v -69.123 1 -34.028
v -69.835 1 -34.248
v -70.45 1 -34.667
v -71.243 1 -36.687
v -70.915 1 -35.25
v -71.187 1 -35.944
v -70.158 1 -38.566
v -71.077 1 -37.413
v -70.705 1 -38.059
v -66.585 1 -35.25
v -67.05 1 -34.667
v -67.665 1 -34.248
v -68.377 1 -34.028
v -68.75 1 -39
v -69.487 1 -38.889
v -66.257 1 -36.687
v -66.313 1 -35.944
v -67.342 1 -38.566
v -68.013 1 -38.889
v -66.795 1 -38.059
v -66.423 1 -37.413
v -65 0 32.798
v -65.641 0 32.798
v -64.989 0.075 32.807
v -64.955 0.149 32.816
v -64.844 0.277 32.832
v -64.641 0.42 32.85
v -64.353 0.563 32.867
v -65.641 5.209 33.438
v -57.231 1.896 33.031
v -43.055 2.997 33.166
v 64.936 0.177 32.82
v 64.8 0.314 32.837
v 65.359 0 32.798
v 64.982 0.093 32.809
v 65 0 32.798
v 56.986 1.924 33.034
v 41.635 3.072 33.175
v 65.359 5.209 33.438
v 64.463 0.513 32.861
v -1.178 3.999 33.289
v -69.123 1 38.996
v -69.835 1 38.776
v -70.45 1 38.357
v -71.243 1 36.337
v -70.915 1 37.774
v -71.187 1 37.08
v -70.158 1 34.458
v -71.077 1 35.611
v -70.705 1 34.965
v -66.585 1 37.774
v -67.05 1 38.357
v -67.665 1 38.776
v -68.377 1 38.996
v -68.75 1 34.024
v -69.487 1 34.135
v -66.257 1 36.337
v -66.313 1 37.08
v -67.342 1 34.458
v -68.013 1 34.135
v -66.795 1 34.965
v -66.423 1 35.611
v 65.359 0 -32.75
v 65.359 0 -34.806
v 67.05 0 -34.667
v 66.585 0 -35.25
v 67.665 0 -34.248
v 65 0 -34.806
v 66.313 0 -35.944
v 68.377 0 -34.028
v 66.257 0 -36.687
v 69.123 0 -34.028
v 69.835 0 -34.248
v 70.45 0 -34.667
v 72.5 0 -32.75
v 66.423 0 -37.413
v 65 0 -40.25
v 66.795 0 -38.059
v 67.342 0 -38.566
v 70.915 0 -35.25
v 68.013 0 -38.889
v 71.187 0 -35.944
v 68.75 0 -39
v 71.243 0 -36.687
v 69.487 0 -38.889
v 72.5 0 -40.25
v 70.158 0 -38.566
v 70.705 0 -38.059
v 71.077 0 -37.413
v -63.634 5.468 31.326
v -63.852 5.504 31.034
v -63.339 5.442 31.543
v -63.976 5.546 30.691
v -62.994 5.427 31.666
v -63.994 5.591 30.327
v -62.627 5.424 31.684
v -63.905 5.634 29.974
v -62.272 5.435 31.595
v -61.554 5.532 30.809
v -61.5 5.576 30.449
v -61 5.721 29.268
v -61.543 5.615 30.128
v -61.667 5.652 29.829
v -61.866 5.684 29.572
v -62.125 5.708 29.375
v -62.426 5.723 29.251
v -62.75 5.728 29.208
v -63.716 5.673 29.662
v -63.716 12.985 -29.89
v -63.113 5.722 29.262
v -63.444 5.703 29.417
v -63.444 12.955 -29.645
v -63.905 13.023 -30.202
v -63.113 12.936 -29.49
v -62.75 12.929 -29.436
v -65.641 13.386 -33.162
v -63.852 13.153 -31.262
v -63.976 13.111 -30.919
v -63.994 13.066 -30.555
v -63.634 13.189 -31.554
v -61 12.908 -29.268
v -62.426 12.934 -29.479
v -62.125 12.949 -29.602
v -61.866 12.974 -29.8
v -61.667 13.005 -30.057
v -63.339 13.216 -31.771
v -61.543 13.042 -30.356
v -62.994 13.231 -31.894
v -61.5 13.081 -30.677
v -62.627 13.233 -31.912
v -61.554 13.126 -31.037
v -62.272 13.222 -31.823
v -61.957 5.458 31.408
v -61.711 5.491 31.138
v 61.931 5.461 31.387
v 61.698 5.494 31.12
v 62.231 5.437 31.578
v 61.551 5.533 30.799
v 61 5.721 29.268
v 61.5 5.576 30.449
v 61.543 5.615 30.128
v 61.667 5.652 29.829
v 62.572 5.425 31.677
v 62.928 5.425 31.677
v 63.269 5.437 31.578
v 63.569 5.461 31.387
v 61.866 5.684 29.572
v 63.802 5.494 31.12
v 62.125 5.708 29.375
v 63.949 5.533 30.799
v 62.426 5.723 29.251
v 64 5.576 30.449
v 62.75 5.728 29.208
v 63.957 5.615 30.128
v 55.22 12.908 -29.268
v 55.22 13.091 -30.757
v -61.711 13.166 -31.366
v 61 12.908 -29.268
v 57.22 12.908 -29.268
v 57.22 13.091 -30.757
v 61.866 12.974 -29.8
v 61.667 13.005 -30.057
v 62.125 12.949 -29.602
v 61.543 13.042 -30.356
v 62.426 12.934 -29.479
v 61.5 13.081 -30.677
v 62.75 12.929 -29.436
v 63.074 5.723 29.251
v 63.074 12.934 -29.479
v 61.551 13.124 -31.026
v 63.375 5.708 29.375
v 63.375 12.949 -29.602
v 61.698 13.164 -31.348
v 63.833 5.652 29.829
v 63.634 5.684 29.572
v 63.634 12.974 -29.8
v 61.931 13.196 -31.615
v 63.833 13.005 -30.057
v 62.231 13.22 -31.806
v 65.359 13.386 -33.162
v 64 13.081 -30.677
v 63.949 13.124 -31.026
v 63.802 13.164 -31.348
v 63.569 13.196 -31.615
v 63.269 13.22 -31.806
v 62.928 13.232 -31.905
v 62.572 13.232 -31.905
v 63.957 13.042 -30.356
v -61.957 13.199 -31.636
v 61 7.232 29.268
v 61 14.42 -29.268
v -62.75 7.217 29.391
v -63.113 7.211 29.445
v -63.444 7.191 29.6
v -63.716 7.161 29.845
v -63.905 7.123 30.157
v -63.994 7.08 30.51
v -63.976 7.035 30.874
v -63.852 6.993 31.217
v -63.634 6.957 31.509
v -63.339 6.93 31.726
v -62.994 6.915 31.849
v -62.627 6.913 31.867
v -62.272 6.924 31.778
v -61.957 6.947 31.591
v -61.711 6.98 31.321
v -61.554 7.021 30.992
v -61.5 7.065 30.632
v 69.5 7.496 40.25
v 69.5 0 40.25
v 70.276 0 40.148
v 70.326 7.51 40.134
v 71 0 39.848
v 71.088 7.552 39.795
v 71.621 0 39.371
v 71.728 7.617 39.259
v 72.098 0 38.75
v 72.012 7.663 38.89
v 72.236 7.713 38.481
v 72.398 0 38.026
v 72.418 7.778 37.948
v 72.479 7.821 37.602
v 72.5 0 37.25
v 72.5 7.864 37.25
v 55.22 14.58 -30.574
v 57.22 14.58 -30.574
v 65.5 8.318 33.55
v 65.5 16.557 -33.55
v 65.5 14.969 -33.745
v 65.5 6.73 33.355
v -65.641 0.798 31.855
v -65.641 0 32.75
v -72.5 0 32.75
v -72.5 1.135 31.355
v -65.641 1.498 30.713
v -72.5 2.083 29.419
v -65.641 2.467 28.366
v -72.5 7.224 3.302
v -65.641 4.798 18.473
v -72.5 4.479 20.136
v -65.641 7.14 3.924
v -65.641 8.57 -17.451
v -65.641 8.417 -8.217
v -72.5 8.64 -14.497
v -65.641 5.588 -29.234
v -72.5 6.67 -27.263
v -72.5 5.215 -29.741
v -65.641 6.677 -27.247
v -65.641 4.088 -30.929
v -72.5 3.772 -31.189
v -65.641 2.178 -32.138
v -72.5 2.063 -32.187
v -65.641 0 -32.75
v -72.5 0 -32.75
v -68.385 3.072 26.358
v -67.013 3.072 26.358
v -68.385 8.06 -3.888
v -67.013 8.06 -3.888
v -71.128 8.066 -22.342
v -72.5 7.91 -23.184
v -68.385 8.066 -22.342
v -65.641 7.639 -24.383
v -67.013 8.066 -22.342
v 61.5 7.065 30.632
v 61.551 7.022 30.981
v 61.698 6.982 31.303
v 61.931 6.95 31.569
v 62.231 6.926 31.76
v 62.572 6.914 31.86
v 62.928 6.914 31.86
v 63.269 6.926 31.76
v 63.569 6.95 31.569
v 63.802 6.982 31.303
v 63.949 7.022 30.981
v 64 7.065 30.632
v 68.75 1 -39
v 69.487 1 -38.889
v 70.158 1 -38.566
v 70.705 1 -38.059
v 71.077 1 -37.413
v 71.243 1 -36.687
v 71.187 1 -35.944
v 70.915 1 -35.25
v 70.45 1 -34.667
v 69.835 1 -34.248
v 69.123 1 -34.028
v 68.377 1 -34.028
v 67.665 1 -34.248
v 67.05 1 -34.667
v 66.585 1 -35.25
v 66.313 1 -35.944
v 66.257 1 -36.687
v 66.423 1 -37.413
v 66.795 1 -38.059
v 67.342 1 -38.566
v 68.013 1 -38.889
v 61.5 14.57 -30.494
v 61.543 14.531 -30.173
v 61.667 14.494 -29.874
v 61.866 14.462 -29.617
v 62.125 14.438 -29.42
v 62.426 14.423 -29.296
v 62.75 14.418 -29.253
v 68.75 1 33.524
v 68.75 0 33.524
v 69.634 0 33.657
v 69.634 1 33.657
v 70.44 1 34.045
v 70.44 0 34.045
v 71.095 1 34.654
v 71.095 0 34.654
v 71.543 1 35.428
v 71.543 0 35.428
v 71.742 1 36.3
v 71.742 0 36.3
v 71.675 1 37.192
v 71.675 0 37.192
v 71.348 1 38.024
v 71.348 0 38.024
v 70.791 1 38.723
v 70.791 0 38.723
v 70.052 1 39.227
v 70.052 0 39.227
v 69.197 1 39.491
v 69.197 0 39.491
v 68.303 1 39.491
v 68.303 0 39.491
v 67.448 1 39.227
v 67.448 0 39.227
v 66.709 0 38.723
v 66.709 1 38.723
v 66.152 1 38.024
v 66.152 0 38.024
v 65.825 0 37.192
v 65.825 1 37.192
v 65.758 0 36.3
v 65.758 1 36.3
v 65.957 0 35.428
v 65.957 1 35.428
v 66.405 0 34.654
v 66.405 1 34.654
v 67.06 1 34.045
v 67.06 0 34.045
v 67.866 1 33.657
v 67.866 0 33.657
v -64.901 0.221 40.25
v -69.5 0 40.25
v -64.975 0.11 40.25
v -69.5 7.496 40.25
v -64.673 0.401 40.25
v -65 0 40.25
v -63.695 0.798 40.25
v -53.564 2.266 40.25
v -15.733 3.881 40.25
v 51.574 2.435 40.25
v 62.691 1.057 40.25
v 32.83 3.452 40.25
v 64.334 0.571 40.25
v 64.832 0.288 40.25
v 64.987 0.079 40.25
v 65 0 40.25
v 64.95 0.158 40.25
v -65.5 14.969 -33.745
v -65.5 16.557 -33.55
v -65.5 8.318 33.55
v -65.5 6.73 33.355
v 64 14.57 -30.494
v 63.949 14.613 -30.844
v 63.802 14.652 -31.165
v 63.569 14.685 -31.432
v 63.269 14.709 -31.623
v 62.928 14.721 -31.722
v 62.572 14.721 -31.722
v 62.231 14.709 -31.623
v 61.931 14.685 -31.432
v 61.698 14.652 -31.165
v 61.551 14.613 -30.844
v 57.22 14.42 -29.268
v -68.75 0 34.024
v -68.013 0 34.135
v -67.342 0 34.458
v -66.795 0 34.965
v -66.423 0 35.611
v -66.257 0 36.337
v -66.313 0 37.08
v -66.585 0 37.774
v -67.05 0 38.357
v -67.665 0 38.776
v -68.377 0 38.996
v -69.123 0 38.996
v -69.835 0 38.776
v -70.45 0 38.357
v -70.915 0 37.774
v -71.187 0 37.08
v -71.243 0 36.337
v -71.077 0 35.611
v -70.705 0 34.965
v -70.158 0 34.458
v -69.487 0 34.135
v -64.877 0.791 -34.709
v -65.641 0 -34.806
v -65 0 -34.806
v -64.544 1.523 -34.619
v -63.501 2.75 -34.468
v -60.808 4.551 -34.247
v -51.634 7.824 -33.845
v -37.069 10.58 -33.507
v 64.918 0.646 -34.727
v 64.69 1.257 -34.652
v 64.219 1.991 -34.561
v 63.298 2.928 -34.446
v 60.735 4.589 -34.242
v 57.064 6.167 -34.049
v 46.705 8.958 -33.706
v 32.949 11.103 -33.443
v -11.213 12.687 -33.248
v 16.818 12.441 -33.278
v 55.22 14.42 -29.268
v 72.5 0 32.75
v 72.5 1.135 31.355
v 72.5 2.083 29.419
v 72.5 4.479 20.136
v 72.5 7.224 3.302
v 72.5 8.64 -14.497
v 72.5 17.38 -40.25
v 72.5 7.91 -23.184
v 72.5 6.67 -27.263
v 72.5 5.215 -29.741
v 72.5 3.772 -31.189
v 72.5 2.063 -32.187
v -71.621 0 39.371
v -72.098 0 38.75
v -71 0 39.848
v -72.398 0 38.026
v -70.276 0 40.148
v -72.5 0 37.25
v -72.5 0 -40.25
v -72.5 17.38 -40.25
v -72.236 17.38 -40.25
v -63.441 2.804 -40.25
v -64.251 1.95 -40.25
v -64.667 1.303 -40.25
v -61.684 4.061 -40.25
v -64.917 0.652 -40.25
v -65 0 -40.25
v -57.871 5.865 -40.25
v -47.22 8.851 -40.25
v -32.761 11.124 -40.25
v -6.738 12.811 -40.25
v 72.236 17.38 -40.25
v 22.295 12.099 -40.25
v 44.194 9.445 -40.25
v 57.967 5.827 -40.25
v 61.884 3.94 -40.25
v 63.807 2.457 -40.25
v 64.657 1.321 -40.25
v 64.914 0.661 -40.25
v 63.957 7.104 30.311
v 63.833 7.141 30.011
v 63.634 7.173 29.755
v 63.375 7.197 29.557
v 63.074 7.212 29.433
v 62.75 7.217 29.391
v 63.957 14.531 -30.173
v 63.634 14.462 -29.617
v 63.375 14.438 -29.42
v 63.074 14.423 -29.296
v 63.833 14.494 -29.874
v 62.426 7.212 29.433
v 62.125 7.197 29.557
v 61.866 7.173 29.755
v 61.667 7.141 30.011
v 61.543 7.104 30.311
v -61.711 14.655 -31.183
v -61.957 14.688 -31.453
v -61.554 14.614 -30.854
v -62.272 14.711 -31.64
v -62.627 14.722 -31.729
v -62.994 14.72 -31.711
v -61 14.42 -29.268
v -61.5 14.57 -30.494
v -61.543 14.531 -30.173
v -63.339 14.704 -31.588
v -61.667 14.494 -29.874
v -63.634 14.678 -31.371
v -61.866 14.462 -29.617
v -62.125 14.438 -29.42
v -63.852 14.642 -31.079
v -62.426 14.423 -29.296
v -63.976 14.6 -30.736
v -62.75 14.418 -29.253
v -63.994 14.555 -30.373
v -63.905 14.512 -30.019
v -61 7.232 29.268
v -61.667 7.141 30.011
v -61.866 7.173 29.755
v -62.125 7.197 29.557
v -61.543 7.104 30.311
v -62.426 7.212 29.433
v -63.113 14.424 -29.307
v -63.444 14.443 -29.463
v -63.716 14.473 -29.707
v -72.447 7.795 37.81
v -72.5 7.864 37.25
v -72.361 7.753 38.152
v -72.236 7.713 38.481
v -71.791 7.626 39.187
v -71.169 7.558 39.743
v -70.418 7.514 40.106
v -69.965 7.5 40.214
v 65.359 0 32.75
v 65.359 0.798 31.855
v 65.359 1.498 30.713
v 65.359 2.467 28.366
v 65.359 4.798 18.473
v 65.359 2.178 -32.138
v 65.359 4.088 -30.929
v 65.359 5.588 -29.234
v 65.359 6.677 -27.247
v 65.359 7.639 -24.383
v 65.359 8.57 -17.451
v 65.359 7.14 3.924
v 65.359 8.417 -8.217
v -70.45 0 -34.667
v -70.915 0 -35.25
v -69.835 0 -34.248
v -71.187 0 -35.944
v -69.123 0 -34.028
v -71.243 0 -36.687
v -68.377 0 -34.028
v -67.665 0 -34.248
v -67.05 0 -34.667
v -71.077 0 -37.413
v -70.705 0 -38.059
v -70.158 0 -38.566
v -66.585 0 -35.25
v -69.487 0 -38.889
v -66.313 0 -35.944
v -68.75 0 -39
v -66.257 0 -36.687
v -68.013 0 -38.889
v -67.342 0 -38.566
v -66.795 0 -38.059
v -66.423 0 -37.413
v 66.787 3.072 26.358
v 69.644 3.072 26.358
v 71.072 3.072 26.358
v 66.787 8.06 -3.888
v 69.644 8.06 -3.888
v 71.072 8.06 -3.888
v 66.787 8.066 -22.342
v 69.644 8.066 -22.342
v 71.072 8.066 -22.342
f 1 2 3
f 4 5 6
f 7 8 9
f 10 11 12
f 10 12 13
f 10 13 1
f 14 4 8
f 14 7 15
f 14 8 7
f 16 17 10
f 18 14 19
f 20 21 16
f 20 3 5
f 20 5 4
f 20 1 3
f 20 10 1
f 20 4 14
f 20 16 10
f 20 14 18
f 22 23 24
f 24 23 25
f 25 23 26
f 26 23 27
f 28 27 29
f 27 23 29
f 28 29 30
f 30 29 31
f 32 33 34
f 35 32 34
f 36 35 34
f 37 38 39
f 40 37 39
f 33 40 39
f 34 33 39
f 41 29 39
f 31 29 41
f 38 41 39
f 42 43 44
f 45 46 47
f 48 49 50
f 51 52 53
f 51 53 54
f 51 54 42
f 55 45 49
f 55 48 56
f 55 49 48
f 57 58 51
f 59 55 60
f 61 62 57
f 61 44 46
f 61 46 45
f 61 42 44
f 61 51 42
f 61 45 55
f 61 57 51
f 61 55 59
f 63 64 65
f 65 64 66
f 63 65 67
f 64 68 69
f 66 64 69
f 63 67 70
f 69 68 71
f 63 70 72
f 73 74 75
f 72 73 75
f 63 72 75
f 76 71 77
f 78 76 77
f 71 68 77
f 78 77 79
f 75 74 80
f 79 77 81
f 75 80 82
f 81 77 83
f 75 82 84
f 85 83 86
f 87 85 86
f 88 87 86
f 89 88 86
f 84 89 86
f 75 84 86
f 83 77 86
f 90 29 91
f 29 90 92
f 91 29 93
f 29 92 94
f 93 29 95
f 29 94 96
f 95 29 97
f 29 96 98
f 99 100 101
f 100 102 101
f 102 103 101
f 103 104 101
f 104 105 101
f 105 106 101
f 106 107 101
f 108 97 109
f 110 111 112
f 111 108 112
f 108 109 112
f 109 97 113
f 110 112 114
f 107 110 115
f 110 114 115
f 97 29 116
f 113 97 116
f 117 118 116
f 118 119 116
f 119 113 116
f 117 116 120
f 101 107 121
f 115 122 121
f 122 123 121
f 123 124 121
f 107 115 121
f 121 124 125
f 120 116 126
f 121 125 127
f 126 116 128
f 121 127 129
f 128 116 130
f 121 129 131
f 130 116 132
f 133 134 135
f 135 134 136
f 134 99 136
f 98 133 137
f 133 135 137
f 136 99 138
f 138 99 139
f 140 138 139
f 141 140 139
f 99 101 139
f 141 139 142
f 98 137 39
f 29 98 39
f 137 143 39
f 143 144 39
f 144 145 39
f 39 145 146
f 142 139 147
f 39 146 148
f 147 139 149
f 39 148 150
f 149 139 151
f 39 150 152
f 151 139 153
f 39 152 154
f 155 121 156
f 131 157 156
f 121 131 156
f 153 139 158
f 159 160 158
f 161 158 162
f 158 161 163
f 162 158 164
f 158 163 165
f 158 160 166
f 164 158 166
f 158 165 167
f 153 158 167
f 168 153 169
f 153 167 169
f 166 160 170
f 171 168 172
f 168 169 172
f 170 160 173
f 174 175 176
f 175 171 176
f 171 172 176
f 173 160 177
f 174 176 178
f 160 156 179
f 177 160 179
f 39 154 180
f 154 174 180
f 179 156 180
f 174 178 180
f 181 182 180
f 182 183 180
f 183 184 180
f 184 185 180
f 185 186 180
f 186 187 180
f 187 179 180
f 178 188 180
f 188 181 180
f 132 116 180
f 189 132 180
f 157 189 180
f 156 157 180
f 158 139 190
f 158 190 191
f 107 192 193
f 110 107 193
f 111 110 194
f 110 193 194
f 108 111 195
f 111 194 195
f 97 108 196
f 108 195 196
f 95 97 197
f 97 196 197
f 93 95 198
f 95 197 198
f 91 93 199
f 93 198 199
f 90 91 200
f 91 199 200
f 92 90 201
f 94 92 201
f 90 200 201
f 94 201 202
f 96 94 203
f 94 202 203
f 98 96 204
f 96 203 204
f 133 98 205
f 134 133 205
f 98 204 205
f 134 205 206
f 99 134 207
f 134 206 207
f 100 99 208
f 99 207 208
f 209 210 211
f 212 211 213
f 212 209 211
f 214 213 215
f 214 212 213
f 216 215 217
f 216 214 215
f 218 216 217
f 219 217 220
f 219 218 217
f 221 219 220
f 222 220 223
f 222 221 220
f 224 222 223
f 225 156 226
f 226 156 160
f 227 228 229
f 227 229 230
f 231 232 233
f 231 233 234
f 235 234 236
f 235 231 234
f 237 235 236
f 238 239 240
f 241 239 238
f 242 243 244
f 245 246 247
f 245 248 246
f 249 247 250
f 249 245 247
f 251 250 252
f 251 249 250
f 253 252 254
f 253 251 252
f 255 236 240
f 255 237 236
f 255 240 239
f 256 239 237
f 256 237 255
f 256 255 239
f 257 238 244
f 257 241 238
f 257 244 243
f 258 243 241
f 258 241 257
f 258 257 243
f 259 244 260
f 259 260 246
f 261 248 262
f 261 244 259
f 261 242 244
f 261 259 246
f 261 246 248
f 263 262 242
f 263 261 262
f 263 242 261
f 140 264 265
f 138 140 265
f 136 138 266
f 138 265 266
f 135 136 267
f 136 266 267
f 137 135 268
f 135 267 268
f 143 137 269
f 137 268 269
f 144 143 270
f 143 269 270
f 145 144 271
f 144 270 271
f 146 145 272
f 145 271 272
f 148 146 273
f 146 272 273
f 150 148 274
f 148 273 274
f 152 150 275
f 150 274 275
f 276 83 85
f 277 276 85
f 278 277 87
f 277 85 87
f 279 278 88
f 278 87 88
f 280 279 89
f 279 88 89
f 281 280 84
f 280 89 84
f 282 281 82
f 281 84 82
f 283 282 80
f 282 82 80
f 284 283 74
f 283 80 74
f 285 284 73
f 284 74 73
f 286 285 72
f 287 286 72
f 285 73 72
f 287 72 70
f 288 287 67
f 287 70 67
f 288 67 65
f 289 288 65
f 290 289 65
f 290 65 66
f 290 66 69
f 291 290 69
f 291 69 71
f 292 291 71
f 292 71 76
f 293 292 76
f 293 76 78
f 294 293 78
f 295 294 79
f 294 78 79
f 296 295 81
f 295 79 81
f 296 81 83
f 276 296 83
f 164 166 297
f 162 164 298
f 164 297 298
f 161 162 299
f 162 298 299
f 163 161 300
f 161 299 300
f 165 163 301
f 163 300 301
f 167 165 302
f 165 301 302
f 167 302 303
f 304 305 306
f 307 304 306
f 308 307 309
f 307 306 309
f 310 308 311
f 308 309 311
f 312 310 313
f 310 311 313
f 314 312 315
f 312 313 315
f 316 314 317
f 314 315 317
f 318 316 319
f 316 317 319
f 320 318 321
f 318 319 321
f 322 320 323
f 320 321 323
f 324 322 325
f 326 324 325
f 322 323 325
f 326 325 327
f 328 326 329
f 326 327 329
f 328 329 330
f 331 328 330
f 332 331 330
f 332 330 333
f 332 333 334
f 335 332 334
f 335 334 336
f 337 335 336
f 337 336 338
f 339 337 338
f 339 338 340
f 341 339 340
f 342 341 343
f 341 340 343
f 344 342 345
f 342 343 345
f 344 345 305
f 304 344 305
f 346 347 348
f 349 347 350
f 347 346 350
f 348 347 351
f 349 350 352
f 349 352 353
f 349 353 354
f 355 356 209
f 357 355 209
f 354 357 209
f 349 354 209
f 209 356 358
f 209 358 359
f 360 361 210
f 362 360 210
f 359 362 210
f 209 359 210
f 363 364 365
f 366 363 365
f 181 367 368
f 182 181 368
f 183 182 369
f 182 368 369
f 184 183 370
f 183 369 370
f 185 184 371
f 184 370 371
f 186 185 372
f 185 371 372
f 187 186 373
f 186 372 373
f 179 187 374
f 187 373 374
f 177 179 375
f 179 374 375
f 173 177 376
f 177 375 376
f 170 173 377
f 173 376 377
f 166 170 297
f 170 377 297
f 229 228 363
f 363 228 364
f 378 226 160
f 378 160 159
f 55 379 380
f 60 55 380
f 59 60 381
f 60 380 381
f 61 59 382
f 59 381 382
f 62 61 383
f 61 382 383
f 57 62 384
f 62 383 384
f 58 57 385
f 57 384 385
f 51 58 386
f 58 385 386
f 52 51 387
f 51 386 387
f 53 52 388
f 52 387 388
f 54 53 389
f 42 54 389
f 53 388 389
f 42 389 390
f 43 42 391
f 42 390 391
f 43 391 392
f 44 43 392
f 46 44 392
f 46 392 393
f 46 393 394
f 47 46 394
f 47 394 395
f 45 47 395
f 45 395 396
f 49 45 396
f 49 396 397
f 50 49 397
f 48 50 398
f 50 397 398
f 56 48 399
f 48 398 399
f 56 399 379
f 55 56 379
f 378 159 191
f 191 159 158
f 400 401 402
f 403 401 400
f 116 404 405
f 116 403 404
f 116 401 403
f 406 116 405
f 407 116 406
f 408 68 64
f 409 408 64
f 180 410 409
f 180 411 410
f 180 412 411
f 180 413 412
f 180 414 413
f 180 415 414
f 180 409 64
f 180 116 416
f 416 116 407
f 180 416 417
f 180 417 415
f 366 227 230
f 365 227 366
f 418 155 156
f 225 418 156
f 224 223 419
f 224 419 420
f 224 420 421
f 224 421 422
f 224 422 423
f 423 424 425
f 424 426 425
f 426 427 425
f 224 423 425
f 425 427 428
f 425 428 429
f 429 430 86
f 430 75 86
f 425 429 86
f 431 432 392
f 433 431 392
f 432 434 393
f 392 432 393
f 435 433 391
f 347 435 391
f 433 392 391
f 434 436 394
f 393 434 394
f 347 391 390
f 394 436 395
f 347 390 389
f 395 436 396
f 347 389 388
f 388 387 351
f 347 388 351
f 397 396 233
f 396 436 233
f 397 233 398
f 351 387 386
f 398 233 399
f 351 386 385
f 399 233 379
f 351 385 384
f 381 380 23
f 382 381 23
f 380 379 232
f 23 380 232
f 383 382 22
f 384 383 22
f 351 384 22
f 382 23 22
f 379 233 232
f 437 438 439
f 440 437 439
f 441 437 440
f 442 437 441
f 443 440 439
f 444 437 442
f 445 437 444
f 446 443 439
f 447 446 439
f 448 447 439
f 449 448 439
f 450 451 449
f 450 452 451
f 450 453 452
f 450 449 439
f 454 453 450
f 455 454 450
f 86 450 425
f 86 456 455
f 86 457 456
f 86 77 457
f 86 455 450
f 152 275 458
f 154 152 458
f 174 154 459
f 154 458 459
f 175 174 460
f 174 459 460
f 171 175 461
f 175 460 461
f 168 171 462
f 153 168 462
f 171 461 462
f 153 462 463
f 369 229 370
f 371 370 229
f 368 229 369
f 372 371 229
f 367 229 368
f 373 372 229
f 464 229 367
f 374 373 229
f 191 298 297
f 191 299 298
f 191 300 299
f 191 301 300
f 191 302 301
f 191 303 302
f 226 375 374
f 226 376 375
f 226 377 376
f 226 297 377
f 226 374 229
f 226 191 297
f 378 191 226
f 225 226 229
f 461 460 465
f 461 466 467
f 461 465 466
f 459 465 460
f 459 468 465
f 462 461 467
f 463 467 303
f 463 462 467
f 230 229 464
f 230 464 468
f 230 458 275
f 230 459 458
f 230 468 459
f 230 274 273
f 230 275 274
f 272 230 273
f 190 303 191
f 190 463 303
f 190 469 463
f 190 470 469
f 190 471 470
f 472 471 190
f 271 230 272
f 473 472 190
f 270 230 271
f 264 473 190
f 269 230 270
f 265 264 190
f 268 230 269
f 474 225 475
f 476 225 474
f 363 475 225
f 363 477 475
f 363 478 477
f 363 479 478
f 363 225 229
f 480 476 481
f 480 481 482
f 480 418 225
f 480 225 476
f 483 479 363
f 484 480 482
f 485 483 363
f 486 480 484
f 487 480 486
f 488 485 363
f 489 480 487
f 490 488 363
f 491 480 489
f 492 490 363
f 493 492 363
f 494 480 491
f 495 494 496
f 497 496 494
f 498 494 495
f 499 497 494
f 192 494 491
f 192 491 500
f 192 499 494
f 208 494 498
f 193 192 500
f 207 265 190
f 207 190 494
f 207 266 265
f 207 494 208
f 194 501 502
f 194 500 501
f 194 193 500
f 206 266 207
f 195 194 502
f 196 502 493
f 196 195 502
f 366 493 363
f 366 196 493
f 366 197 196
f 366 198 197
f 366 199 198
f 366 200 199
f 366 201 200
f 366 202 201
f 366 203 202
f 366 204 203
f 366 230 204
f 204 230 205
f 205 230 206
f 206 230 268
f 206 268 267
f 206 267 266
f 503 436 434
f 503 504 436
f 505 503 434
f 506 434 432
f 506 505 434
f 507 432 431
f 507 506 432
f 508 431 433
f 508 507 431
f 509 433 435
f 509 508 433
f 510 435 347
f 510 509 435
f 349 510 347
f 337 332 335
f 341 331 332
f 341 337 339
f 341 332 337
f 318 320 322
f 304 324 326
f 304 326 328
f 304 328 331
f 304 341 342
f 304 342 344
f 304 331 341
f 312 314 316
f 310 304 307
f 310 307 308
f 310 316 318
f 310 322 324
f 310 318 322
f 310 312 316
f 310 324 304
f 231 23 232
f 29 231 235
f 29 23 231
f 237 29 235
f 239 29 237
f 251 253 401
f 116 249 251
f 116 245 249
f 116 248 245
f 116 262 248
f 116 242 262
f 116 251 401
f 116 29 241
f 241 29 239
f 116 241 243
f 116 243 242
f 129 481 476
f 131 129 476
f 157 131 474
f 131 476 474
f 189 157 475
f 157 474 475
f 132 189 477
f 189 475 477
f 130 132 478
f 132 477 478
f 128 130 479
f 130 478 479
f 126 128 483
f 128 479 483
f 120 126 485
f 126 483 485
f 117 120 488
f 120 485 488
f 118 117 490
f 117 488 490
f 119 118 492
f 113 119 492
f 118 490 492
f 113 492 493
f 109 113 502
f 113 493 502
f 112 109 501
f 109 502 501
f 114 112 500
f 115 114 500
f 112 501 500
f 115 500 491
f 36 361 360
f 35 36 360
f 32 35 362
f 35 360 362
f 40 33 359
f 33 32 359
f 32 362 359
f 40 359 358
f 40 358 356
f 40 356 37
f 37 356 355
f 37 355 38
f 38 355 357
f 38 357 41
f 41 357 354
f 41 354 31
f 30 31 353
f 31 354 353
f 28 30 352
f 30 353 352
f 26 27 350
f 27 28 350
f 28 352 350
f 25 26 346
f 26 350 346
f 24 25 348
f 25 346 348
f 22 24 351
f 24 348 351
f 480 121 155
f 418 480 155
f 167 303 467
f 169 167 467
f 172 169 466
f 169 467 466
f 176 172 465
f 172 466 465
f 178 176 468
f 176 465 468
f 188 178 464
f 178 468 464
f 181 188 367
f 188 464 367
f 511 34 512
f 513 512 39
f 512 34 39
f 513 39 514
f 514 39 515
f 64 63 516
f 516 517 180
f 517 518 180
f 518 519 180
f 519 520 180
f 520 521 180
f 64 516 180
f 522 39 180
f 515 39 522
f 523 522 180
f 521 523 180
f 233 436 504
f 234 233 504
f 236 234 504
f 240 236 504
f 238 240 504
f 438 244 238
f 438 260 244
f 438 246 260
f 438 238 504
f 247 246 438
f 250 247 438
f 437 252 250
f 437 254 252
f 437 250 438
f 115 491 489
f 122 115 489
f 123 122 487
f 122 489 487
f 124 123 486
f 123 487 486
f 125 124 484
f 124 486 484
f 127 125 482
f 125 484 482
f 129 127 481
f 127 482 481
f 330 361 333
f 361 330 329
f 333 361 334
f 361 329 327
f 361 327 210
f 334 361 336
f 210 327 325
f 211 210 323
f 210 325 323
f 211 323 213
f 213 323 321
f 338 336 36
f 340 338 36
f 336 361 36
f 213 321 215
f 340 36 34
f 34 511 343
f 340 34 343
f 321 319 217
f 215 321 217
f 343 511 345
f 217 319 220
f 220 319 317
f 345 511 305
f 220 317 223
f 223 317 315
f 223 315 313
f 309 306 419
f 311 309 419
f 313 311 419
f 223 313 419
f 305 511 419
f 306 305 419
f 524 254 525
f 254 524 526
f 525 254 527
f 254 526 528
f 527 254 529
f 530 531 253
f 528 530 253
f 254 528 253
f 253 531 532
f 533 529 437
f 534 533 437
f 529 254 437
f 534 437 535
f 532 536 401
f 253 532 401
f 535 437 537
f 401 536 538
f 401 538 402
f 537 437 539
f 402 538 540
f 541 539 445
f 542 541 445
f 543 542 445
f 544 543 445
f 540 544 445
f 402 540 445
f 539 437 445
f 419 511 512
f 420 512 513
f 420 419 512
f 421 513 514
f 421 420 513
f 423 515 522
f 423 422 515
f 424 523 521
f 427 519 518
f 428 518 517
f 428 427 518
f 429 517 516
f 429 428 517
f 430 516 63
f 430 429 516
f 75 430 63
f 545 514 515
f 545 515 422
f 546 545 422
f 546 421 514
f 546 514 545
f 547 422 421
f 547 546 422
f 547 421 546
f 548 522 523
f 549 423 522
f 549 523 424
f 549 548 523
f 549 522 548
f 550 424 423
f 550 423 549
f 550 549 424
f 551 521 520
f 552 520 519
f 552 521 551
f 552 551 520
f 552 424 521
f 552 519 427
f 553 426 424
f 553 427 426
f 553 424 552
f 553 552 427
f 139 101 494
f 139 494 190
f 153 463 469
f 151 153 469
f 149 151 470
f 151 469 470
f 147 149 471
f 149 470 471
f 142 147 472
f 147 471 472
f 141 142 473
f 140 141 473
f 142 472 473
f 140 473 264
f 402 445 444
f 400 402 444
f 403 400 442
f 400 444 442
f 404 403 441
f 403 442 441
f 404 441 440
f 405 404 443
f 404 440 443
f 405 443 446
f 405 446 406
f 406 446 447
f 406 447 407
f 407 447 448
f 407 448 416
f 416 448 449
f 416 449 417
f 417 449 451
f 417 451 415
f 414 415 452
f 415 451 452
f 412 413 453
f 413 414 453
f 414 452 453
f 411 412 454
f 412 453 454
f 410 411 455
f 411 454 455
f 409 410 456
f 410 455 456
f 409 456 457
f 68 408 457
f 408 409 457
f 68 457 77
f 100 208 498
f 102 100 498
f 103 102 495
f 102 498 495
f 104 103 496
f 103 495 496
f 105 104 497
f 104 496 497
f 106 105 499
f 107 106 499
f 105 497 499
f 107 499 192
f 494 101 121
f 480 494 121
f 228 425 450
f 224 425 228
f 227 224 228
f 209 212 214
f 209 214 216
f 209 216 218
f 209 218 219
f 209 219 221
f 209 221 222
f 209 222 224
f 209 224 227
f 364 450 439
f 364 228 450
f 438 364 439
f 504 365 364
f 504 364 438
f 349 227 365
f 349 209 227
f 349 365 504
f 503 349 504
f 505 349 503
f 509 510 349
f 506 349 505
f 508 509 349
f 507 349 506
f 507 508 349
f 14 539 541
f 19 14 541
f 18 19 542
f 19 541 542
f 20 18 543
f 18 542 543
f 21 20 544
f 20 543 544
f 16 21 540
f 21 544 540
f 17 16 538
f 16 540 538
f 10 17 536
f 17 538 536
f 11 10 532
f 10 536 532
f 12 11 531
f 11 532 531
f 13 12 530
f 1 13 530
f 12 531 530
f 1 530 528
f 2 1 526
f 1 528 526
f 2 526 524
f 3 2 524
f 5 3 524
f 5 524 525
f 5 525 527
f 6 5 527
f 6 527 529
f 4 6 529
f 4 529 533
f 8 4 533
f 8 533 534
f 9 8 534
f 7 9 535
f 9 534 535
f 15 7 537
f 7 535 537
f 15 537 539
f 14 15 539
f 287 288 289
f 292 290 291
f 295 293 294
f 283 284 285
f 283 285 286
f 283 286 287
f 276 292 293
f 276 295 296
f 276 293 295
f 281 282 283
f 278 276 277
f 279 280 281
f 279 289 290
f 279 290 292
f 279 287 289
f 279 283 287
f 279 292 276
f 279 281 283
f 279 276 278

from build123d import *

# Parameters (mm, degrees)
SKETCH1_W            = 145
SKETCH1_H            = 80.5
SKETCH1_W_2          = 131
SKETCH1_H_2          = 67.1
BOSS_EXTRUDE1_DEPTH  = 17.38
SKETCH2_W            = 145.621836594
SKETCH2_H            = 81.229894902
CUT_EXTRUDE1_DEPTH   = 10.38
FILLET1_R            = 3
SKETCH5_W            = 131
SKETCH5_H            = 67.1
SKETCH5_W_2          = 122
SKETCH5_H_2          = 58.53632086
BOSS_EXTRUDE17_DEPTH = 17.38
SKETCH9_W            = 144.471640976
SKETCH9_H            = 84.136143584
CUT_EXTRUDE5_DEPTH   = 9.6
SKETCH6_W            = 131
SKETCH6_H            = 67.603909288
CUT_EXTRUDE6_DEPTH   = 1.6
SKETCH10_RX          = 65
SKETCH10_RY          = 4
CUT_EXTRUDE8_DEPTH   = 10.7
SKETCH12_RX          = 65
SKETCH12_RY          = 12.88
CUT_EXTRUDE9_DEPTH   = 10.7
CUT_EXTRUDE12_START  = -145
CUT_EXTRUDE12_DEPTH  = 145
CUT_EXTRUDE13_DEPTH  = 10
SKETCH21_W           = 131
SKETCH21_H           = 67.1
CUT_EXTRUDE14_DEPTH  = 30
SKETCH23_R           = 2.5
SKETCH23_R_2         = 3
CUT_EXTRUDE15_DEPTH  = 1
CUT_EXTRUDE17_DEPTH  = 10


# Read off the part's stored shape, not the designer's step: Cut-Extrude12
with BuildPart() as part:
    # Sketch1 → Boss-Extrude1 (new body)
    with BuildSketch(Plane(origin=(0, 0, 0), x_dir=(1, 0, 0), z_dir=(0, 1, 0))):
        Rectangle(SKETCH1_W, SKETCH1_H)
        Rectangle(SKETCH1_W_2, SKETCH1_H_2, mode=Mode.SUBTRACT)
    extrude(amount=BOSS_EXTRUDE1_DEPTH)

    # Sketch2 → Cut-Extrude1 (cut)
    with BuildSketch(Plane(origin=(0, 12.253191712, 1.504502764), x_dir=(-1, 0, 0), z_dir=(0, 0.9925461516413239, 0.12186934340513403))):
        with Locations((0.310918297, -1.453124341)):
            Rectangle(SKETCH2_W, SKETCH2_H)
    extrude(amount=CUT_EXTRUDE1_DEPTH, mode=Mode.SUBTRACT)

    # Fillet1
    fillet1_edges = [part.edges().sort_by_distance(p)[0] for p in [
        (72.5, 3.747921424, 40.25),
        (-72.5, 3.747921424, 40.25),
    ]]
    fillet(fillet1_edges, radius=FILLET1_R)

    # Sketch5 → Boss-Extrude17 (add)
    with BuildSketch(Plane(origin=(0, 0, 0), x_dir=(1, 0, 0), z_dir=(0, 1, 0))):
        Rectangle(SKETCH5_W, SKETCH5_H)
        Rectangle(SKETCH5_W_2, SKETCH5_H_2, mode=Mode.SUBTRACT)
    extrude(amount=BOSS_EXTRUDE17_DEPTH)

    # Sketch9 → Cut-Extrude5 (cut)
    with BuildSketch(Plane(origin=(0, 12.253191712, 1.504502764), x_dir=(1, 0, 0), z_dir=(0, 0.9925461516413236, 0.12186934340513404))):
        Rectangle(SKETCH9_W, SKETCH9_H)
    extrude(amount=CUT_EXTRUDE5_DEPTH, mode=Mode.SUBTRACT)

    # Sketch6 → Cut-Extrude6 (cut)
    with BuildSketch(Plane(origin=(0, 12.253191712, 1.504502764), x_dir=(-1, 0, 0), z_dir=(0, 0.9925461516413239, 0.12186934340513403))):
        with Locations((0, -1.515801317)):
            Rectangle(SKETCH6_W, SKETCH6_H)
    extrude(amount=-CUT_EXTRUDE6_DEPTH, mode=Mode.SUBTRACT)

    # Sketch10 → Cut-Extrude8 (cut)
    with BuildSketch(Plane.XY.offset(40.25)):
        with Locations((0, 0)):
            Ellipse(SKETCH10_RX, SKETCH10_RY)
    extrude(amount=-CUT_EXTRUDE8_DEPTH, mode=Mode.SUBTRACT)

    # Sketch12 → Cut-Extrude9 (cut)
    with BuildSketch(Plane(origin=(0, 0, -40.25), x_dir=(-1, 0, 0), z_dir=(0, 0, -1))):
        with Locations((0, 0)):
            Ellipse(SKETCH12_RX, SKETCH12_RY)
    extrude(amount=-CUT_EXTRUDE9_DEPTH, mode=Mode.SUBTRACT)

    # Cut-Extrude12 outline → Cut-Extrude12 (cut)
    with BuildSketch(Plane.ZY.offset(72.5).offset(CUT_EXTRUDE12_START)):
        with BuildLine():
            add(Edge.make_bspline(
                [(32.75, 0), (29.101844556, 4.008435343), (19.440941834, 4.451750453), (-1.339502668, 8.255924616), (-30.587167794, 14.944494998), (-32.75, 0)],
                knots=[0, 0, 0, 0, 0, 0, 1, 1, 1, 1, 1, 1], degree=5))
            Line((-32.75, 0), (32.75, 0))
        make_face()
    extrude(amount=CUT_EXTRUDE12_DEPTH, mode=Mode.SUBTRACT)

    # Sketch19 → Cut-Extrude13 (cut)
    with BuildSketch(Plane(origin=(0, 10.66511787, 1.309511815), x_dir=(1, 0, 0), z_dir=(0, 0.9925461516413238, 0.12186934340513403))):
        with BuildLine():
            ThreePointArc((61.5, 32.0425), (61.866116524, 31.158616524), (62.75, 30.7925))
            Line((62.75, 30.7925), (62.75, 32.0425))
            Line((62.75, 32.0425), (61.5, 32.0425))
        make_face()
        with BuildLine():
            Line((62.75, 32.0425), (62.75, 30.7925))
            ThreePointArc((62.75, 30.7925), (63.633883476, 31.158616524), (64, 32.0425))
            ThreePointArc((64, 32.0425), (62.75, 33.2925), (61.5, 32.0425))
            Line((61.5, 32.0425), (62.75, 32.0425))
        make_face()
        with BuildLine():
            ThreePointArc((64, -29.5425), (63.633883476, -28.658616524), (62.75, -28.2925))
            Line((62.75, -28.2925), (62.75, -29.5425))
            Line((62.75, -29.5425), (61.5, -29.5425))
            ThreePointArc((61.5, -29.5425), (62.75, -30.7925), (64, -29.5425))
        make_face()
        with BuildLine():
            Line((62.75, -29.5425), (62.75, -28.2925))
            ThreePointArc((62.75, -28.2925), (61.866116524, -28.658616524), (61.5, -29.5425))
            Line((61.5, -29.5425), (62.75, -29.5425))
        make_face()
        with BuildLine():
            ThreePointArc((-61.5, -29.5425), (-61.866116524, -28.658616524), (-62.75, -28.2925))
            Line((-62.75, -28.2925), (-62.75, -29.5425))
            Line((-62.75, -29.5425), (-61.5, -29.5425))
        make_face()
        with BuildLine():
            Line((-62.75, -29.5425), (-62.75, -28.2925))
            ThreePointArc((-62.75, -28.2925), (-63.633883476, -30.426383476), (-61.5, -29.5425))
            Line((-61.5, -29.5425), (-62.75, -29.5425))
        make_face()
        with BuildLine():
            ThreePointArc((-61.5, 32.0425), (-63.633883476, 32.926383476), (-62.75, 30.7925))
            Line((-62.75, 30.7925), (-62.75, 32.0425))
            Line((-62.75, 32.0425), (-61.5, 32.0425))
        make_face()
        with BuildLine():
            Line((-62.75, 32.0425), (-62.75, 30.7925))
            ThreePointArc((-62.75, 30.7925), (-61.866116524, 31.158616524), (-61.5, 32.0425))
            Line((-61.5, 32.0425), (-62.75, 32.0425))
        make_face()
    extrude(amount=-CUT_EXTRUDE13_DEPTH, mode=Mode.SUBTRACT)

    # Sketch21 → Cut-Extrude14 (cut)
    with BuildSketch(Plane(origin=(0, 9.176298642, 1.1267078), x_dir=(1, 0, 0), z_dir=(0, 0.9925461516413236, 0.12186934340513401))):
        with Locations((-0.141032576, 0.996407471)):
            Rectangle(SKETCH21_W, SKETCH21_H)
    extrude(amount=-CUT_EXTRUDE14_DEPTH, mode=Mode.SUBTRACT)

    # Sketch23 → Cut-Extrude15 (cut)
    with BuildSketch(Plane(origin=(0, 0, 0), x_dir=(-1, 0, 0), z_dir=(0, -1, 0))):
        with Locations(Location((-68.75, 36.5, 0), (0, 0, 90))):
            Circle(SKETCH23_R)
        with Locations(Location((-68.75, -36.524032163, 0), (0, 0, 90))):
            Circle(SKETCH23_R_2)
        with Locations(Location((68.75, -36.524032163, 0), (0, 0, 90))):
            Circle(SKETCH23_R)
        with Locations(Location((68.75, 36.5, 0), (0, 0, 90))):
            Circle(SKETCH23_R)
    extrude(amount=-CUT_EXTRUDE15_DEPTH, mode=Mode.SUBTRACT)

    # Sketch25 → Cut-Extrude17 (cut)
    with BuildSketch(Plane(origin=(0, 9.176298642, 1.1267078), x_dir=(1, 0, 0), z_dir=(0, -0.9925461516413238, -0.1218693434051341))):
        Polygon((57.22, -32.123128384), (57.22, -32.0425), (57.22, -30.623128384), (55.22, -30.623128384), (55.22, -32.123128384), align=None)
    extrude(amount=-CUT_EXTRUDE17_DEPTH, mode=Mode.SUBTRACT)


solid = part.part
